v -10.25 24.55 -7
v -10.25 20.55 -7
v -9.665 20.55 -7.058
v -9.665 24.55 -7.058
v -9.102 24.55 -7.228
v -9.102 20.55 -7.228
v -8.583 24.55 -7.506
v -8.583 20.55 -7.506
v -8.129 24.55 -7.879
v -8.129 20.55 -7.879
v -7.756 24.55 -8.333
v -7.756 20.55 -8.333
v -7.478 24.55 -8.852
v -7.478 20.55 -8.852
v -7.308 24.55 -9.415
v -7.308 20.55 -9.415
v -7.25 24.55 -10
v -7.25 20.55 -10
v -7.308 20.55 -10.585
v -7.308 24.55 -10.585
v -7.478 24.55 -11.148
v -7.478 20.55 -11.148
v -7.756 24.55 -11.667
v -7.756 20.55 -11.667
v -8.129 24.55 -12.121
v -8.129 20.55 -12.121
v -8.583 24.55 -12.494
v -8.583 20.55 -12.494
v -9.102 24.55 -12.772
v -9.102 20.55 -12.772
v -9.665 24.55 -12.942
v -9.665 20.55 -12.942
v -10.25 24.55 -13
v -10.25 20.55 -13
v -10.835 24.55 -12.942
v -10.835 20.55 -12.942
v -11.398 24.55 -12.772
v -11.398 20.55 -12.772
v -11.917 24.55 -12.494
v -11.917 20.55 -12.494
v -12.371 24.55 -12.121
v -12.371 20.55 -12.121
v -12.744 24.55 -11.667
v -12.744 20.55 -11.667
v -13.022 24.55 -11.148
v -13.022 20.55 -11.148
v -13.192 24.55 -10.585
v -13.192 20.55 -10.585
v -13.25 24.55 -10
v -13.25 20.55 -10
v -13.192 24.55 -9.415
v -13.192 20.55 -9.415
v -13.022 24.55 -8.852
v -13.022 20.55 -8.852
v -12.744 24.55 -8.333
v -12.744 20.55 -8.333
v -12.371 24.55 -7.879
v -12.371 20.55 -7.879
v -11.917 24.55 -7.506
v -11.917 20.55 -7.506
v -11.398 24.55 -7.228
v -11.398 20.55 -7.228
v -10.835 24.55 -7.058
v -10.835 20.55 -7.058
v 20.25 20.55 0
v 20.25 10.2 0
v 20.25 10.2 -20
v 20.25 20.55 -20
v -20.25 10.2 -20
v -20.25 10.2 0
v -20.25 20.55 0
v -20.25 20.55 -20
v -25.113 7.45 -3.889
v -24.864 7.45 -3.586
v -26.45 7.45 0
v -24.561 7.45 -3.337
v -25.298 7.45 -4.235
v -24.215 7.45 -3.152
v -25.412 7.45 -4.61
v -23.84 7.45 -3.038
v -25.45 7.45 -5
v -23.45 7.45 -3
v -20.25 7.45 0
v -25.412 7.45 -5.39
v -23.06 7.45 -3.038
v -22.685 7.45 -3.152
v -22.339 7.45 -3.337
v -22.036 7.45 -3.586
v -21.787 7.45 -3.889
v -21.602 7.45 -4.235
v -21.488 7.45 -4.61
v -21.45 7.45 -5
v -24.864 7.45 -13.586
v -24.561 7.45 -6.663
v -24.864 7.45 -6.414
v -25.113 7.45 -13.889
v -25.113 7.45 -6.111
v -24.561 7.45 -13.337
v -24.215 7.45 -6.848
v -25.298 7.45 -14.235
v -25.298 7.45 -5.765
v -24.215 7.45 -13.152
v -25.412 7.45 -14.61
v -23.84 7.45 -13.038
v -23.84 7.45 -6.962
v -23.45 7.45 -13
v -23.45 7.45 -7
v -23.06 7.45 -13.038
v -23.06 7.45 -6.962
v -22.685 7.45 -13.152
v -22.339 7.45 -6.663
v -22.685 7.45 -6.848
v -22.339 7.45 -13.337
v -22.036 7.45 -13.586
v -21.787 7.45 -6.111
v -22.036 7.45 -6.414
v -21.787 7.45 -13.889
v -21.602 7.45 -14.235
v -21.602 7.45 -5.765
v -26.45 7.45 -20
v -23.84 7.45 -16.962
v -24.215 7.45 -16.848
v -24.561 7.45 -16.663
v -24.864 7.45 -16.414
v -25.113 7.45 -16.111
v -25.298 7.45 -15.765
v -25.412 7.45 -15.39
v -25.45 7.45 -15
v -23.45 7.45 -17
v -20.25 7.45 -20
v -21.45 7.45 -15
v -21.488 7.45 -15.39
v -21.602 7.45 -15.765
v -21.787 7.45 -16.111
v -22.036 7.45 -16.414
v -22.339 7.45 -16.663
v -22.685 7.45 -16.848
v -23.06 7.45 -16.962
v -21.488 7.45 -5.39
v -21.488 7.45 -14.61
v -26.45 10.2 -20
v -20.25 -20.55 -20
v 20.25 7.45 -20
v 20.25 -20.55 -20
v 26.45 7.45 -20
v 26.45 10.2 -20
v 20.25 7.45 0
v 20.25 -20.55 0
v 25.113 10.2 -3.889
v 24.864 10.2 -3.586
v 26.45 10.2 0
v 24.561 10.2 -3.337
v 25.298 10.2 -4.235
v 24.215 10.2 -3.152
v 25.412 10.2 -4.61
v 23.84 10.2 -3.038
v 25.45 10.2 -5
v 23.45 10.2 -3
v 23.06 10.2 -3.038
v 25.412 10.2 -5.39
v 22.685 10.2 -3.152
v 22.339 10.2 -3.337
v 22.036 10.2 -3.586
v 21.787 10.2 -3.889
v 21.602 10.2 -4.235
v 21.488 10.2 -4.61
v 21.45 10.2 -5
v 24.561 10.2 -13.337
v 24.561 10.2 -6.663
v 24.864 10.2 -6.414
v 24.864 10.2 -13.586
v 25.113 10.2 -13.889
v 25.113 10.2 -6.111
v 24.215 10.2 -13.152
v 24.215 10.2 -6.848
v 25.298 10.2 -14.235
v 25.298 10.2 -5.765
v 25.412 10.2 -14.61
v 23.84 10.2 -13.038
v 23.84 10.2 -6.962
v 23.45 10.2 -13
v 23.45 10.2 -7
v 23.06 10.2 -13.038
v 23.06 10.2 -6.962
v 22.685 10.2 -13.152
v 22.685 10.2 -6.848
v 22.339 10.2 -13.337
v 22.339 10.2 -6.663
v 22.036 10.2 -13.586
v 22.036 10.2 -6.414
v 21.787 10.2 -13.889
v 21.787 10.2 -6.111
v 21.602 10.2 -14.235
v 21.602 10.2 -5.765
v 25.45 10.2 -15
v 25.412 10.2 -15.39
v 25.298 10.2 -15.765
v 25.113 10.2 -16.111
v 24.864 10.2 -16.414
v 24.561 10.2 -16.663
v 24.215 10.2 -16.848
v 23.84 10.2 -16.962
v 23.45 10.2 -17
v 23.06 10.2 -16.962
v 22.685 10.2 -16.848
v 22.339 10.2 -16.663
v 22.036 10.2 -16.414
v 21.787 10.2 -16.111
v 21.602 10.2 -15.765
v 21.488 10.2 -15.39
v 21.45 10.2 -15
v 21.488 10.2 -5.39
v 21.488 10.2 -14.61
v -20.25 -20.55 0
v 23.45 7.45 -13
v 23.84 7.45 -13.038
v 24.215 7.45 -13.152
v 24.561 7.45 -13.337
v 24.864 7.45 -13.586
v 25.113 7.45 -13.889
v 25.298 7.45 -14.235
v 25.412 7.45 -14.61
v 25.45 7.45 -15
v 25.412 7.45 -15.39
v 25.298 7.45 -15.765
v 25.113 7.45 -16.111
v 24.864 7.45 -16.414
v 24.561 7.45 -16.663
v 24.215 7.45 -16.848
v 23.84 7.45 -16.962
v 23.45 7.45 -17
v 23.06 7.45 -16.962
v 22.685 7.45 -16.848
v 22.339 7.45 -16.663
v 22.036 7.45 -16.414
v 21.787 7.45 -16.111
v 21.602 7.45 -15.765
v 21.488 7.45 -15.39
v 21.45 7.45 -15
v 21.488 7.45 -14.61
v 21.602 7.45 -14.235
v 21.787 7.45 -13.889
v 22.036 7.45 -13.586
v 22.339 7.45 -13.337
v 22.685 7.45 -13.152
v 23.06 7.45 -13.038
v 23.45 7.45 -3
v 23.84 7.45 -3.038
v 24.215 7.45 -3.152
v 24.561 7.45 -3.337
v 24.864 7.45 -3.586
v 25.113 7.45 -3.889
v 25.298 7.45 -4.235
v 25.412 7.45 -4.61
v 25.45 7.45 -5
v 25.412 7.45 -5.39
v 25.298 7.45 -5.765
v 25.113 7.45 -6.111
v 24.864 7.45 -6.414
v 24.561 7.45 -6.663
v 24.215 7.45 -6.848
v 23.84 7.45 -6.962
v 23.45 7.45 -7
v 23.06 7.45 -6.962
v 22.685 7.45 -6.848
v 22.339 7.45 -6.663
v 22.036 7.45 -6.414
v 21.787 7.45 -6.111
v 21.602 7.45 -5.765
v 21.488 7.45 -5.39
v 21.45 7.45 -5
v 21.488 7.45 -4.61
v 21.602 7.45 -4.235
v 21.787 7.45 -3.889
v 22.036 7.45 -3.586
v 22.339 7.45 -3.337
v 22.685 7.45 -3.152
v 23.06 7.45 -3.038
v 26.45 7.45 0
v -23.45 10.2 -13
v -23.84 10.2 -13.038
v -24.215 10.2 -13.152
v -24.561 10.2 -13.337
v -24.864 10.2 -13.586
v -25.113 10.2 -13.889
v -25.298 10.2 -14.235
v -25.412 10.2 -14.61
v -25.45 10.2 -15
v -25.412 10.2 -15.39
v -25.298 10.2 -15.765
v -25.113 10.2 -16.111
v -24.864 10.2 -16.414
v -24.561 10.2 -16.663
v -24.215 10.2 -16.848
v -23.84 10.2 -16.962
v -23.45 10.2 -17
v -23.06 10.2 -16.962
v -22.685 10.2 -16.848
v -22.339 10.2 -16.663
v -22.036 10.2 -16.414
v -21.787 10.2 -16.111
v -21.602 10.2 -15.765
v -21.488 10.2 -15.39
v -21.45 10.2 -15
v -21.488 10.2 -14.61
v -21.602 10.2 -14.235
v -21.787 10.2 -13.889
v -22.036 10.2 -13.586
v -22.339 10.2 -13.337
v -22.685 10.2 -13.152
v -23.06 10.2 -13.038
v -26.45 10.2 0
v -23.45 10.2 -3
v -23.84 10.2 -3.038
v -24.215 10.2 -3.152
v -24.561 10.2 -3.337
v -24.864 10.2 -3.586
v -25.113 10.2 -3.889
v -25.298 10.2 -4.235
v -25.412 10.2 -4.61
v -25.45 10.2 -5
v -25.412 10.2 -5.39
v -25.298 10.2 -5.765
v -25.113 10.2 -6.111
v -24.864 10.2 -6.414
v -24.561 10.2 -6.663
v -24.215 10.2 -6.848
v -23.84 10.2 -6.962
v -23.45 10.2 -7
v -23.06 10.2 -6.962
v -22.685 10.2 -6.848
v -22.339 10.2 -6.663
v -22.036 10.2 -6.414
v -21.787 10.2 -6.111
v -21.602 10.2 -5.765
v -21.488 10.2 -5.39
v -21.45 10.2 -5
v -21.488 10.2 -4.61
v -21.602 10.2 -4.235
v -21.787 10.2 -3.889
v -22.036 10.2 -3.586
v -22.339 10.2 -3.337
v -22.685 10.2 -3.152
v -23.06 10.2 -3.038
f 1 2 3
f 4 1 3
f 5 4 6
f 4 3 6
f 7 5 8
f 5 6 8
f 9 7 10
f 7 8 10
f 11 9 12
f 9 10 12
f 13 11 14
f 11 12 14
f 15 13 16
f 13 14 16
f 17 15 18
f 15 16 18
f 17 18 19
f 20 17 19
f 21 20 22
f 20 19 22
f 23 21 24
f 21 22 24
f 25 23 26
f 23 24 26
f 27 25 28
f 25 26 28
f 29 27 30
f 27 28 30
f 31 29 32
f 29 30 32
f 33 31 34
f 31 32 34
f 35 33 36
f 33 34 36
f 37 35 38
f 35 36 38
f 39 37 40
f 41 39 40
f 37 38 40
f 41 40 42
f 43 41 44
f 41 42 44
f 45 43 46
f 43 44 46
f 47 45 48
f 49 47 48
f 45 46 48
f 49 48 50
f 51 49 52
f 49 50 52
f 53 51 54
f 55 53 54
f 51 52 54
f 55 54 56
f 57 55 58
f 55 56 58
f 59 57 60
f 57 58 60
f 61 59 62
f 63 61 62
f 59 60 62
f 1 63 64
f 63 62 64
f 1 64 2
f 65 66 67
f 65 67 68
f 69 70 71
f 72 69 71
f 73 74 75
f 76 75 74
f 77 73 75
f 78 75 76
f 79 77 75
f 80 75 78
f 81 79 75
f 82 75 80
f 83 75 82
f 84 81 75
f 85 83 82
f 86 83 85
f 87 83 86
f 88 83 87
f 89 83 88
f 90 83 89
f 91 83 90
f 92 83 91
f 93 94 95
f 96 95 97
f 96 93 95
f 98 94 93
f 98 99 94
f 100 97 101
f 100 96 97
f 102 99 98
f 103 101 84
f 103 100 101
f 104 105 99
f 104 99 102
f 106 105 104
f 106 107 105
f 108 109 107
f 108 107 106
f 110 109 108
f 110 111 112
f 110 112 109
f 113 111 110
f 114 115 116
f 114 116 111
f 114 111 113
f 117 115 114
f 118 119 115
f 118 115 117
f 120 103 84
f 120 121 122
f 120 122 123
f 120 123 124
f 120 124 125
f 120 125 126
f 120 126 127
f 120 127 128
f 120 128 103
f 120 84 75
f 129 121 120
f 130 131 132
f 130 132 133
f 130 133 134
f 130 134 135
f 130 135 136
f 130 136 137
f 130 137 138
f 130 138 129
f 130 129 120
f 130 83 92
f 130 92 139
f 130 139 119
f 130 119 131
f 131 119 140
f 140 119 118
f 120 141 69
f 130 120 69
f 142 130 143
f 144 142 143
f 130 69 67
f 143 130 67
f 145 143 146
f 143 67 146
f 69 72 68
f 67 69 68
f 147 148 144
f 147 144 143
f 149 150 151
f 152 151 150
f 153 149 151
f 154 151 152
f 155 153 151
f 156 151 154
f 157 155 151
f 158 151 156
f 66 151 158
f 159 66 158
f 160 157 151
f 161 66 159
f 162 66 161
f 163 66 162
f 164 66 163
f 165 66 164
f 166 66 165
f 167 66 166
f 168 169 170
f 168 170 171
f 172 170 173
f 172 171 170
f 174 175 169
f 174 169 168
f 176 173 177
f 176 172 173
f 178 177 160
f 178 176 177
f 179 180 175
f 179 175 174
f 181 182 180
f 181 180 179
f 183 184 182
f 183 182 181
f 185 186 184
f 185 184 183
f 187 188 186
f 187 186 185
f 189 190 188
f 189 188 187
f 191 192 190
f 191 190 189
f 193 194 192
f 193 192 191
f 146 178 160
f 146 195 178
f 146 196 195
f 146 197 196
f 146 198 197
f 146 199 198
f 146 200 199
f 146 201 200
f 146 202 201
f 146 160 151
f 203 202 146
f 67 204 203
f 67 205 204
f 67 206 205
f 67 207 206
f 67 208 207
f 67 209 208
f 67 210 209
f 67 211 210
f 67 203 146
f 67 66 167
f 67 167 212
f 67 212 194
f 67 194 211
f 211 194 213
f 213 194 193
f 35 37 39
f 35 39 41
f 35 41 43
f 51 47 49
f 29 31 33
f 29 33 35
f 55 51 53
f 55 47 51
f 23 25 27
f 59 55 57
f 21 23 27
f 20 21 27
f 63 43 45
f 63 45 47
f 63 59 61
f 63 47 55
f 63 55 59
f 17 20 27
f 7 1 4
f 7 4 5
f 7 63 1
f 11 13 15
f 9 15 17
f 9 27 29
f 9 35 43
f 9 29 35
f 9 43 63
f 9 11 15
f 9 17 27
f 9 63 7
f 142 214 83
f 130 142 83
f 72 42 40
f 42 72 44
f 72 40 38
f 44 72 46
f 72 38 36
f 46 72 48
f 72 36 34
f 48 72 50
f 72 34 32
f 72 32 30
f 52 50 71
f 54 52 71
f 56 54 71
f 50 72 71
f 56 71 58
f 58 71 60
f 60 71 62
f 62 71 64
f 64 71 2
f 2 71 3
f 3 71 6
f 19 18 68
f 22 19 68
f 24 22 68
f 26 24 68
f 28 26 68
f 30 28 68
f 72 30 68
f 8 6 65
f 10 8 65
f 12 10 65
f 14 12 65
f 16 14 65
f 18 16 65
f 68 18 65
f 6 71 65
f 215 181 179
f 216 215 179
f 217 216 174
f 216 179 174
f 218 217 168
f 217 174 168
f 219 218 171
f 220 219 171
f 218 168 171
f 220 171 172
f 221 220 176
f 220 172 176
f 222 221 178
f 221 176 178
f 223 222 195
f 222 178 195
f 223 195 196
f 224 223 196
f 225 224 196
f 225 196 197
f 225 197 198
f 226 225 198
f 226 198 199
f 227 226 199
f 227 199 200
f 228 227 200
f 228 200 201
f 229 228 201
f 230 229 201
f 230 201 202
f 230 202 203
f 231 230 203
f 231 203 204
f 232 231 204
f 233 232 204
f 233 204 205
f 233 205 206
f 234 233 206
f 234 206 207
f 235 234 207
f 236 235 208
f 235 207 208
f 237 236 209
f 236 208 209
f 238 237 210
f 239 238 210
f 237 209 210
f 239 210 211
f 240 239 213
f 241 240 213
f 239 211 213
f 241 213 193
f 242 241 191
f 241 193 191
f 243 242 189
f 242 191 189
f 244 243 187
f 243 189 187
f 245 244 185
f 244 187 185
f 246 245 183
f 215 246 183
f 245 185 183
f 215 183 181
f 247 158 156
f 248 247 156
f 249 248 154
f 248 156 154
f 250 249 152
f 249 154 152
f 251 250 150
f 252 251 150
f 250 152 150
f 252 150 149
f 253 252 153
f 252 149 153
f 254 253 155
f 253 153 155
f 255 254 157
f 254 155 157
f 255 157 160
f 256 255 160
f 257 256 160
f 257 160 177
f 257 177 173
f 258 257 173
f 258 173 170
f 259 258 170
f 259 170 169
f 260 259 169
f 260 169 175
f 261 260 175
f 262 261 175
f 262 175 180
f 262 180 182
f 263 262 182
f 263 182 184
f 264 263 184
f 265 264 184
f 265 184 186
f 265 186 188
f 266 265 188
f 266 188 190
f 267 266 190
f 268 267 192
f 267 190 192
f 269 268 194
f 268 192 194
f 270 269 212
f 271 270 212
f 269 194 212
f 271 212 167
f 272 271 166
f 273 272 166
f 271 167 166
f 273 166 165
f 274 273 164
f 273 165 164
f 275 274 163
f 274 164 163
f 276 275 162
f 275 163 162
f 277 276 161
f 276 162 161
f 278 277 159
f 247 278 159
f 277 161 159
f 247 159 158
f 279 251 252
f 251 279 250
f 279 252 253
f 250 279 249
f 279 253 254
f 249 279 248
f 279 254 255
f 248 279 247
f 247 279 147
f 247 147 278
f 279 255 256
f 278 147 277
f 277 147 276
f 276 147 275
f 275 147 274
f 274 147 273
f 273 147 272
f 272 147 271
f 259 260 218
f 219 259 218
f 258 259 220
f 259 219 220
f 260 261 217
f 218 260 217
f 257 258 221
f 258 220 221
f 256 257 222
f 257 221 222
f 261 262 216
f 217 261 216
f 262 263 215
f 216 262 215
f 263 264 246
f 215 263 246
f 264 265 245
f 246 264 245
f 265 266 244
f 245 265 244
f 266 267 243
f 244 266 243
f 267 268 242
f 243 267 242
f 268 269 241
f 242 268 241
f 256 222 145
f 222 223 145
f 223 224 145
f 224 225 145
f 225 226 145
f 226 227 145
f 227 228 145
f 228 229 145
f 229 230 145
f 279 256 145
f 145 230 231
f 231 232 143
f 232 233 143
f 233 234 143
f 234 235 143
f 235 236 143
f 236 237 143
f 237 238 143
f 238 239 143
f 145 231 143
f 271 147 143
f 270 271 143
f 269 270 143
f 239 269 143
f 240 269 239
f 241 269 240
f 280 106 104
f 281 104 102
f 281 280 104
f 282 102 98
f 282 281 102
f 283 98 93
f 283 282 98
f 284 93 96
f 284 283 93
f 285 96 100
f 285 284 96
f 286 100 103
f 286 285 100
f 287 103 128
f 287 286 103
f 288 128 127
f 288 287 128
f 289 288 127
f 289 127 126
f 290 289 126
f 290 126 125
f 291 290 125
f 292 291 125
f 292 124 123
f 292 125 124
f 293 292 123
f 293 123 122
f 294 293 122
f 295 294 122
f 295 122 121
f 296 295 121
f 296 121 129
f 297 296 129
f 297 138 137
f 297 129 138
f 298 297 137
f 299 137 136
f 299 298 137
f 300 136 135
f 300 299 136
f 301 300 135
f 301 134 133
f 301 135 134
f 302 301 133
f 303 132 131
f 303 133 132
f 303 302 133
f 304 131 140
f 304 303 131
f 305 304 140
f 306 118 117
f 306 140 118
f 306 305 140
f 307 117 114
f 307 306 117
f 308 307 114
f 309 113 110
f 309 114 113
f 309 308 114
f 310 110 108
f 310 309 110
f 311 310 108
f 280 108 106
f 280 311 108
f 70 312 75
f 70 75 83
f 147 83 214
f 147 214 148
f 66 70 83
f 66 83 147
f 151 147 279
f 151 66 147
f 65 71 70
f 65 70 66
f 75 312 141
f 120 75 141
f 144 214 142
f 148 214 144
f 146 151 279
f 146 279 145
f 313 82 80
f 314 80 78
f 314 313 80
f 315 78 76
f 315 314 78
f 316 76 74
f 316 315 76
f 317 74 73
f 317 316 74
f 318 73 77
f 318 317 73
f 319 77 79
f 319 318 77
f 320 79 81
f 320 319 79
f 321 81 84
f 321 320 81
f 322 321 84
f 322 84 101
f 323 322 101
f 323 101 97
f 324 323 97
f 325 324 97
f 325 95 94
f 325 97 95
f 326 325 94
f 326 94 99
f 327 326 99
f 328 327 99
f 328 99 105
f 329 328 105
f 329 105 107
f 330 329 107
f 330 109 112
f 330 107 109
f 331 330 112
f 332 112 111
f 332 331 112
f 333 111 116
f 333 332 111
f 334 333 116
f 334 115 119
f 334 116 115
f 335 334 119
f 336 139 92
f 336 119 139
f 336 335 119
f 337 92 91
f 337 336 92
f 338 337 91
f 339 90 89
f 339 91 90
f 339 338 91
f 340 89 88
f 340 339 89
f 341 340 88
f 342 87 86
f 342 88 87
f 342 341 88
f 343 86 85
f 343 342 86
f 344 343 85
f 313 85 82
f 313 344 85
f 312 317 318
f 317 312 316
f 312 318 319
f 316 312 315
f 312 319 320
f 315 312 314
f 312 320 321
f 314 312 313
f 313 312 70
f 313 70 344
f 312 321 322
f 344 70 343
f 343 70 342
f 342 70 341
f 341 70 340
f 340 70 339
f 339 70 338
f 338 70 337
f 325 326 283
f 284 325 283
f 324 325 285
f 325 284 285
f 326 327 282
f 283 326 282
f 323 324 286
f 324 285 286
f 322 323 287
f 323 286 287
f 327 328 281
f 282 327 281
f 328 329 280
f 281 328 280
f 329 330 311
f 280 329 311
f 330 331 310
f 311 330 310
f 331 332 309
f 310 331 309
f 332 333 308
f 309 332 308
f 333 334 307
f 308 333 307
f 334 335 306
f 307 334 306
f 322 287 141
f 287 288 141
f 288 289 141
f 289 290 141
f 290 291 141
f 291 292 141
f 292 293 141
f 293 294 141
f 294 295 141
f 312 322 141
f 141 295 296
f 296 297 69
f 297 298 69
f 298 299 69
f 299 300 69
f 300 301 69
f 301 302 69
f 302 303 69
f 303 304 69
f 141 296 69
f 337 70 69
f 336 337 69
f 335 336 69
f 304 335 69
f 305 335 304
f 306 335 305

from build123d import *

# Parameters (mm, degrees)
SKETCH_1_W          = 40.5
SKETCH_1_H          = 41.1
EXTRUDE_1_DEPTH     = 20
SKETCH_2_W          = 20
SKETCH_2_H          = 2.75
EXTRUDE_2_DEPTH     = 6.2
SKETCH_3_R          = 2
CUT_EXTRUDE_1_DEPTH = 6.2
SKETCH_4_R          = 3
EXTRUDE_3_DEPTH     = 4


with BuildPart() as part:
    # 草图1 → 凸台-拉伸1 (new body)
    with BuildSketch(Plane.XY):
        Rectangle(SKETCH_1_W, SKETCH_1_H)
    extrude(amount=-EXTRUDE_1_DEPTH)

    # 草图2 → 凸台-拉伸2 (add)
    with BuildSketch(Plane(origin=(20.25, 0, 0), x_dir=(0, 0, -1), z_dir=(1, 0, 0))):
        with Locations((10, 8.825)):
            Rectangle(SKETCH_2_W, SKETCH_2_H)
    extrude_2 = extrude(amount=EXTRUDE_2_DEPTH)

    # 草图3 → 切除-拉伸1 (cut)
    with BuildSketch(Plane(origin=(0, 10.2, 0), x_dir=(1, 0, 0), z_dir=(0, 1, 0))):
        with Locations(Location((23.45, 5, 0), (0, 0, 270))):
            Circle(SKETCH_3_R)
        with Locations(Location((23.45, 15, 0), (0, 0, 270))):
            Circle(SKETCH_3_R)
    cut_extrude_1 = extrude(amount=-CUT_EXTRUDE_1_DEPTH, mode=Mode.SUBTRACT)

    # 镜向2: 凸台-拉伸2, 切除-拉伸1 across plane
    add(extrude_2.mirror(Plane(origin=(0, 0, 0), x_dir=(0, 0, 1), z_dir=(1, 0, 0))))
    add(cut_extrude_1.mirror(Plane(origin=(0, 0, 0), x_dir=(0, 0, 1), z_dir=(1, 0, 0))), mode=Mode.SUBTRACT)

    # 草图4 → 凸台-拉伸3 (add)
    with BuildSketch(Plane(origin=(0, 20.55, 0), x_dir=(1, 0, 0), z_dir=(0, 1, 0))):
        with Locations(Location((-10.25, 10, 0), (0, 0, 270))):
            Circle(SKETCH_4_R)
    extrude(amount=EXTRUDE_3_DEPTH)


solid = part.part
